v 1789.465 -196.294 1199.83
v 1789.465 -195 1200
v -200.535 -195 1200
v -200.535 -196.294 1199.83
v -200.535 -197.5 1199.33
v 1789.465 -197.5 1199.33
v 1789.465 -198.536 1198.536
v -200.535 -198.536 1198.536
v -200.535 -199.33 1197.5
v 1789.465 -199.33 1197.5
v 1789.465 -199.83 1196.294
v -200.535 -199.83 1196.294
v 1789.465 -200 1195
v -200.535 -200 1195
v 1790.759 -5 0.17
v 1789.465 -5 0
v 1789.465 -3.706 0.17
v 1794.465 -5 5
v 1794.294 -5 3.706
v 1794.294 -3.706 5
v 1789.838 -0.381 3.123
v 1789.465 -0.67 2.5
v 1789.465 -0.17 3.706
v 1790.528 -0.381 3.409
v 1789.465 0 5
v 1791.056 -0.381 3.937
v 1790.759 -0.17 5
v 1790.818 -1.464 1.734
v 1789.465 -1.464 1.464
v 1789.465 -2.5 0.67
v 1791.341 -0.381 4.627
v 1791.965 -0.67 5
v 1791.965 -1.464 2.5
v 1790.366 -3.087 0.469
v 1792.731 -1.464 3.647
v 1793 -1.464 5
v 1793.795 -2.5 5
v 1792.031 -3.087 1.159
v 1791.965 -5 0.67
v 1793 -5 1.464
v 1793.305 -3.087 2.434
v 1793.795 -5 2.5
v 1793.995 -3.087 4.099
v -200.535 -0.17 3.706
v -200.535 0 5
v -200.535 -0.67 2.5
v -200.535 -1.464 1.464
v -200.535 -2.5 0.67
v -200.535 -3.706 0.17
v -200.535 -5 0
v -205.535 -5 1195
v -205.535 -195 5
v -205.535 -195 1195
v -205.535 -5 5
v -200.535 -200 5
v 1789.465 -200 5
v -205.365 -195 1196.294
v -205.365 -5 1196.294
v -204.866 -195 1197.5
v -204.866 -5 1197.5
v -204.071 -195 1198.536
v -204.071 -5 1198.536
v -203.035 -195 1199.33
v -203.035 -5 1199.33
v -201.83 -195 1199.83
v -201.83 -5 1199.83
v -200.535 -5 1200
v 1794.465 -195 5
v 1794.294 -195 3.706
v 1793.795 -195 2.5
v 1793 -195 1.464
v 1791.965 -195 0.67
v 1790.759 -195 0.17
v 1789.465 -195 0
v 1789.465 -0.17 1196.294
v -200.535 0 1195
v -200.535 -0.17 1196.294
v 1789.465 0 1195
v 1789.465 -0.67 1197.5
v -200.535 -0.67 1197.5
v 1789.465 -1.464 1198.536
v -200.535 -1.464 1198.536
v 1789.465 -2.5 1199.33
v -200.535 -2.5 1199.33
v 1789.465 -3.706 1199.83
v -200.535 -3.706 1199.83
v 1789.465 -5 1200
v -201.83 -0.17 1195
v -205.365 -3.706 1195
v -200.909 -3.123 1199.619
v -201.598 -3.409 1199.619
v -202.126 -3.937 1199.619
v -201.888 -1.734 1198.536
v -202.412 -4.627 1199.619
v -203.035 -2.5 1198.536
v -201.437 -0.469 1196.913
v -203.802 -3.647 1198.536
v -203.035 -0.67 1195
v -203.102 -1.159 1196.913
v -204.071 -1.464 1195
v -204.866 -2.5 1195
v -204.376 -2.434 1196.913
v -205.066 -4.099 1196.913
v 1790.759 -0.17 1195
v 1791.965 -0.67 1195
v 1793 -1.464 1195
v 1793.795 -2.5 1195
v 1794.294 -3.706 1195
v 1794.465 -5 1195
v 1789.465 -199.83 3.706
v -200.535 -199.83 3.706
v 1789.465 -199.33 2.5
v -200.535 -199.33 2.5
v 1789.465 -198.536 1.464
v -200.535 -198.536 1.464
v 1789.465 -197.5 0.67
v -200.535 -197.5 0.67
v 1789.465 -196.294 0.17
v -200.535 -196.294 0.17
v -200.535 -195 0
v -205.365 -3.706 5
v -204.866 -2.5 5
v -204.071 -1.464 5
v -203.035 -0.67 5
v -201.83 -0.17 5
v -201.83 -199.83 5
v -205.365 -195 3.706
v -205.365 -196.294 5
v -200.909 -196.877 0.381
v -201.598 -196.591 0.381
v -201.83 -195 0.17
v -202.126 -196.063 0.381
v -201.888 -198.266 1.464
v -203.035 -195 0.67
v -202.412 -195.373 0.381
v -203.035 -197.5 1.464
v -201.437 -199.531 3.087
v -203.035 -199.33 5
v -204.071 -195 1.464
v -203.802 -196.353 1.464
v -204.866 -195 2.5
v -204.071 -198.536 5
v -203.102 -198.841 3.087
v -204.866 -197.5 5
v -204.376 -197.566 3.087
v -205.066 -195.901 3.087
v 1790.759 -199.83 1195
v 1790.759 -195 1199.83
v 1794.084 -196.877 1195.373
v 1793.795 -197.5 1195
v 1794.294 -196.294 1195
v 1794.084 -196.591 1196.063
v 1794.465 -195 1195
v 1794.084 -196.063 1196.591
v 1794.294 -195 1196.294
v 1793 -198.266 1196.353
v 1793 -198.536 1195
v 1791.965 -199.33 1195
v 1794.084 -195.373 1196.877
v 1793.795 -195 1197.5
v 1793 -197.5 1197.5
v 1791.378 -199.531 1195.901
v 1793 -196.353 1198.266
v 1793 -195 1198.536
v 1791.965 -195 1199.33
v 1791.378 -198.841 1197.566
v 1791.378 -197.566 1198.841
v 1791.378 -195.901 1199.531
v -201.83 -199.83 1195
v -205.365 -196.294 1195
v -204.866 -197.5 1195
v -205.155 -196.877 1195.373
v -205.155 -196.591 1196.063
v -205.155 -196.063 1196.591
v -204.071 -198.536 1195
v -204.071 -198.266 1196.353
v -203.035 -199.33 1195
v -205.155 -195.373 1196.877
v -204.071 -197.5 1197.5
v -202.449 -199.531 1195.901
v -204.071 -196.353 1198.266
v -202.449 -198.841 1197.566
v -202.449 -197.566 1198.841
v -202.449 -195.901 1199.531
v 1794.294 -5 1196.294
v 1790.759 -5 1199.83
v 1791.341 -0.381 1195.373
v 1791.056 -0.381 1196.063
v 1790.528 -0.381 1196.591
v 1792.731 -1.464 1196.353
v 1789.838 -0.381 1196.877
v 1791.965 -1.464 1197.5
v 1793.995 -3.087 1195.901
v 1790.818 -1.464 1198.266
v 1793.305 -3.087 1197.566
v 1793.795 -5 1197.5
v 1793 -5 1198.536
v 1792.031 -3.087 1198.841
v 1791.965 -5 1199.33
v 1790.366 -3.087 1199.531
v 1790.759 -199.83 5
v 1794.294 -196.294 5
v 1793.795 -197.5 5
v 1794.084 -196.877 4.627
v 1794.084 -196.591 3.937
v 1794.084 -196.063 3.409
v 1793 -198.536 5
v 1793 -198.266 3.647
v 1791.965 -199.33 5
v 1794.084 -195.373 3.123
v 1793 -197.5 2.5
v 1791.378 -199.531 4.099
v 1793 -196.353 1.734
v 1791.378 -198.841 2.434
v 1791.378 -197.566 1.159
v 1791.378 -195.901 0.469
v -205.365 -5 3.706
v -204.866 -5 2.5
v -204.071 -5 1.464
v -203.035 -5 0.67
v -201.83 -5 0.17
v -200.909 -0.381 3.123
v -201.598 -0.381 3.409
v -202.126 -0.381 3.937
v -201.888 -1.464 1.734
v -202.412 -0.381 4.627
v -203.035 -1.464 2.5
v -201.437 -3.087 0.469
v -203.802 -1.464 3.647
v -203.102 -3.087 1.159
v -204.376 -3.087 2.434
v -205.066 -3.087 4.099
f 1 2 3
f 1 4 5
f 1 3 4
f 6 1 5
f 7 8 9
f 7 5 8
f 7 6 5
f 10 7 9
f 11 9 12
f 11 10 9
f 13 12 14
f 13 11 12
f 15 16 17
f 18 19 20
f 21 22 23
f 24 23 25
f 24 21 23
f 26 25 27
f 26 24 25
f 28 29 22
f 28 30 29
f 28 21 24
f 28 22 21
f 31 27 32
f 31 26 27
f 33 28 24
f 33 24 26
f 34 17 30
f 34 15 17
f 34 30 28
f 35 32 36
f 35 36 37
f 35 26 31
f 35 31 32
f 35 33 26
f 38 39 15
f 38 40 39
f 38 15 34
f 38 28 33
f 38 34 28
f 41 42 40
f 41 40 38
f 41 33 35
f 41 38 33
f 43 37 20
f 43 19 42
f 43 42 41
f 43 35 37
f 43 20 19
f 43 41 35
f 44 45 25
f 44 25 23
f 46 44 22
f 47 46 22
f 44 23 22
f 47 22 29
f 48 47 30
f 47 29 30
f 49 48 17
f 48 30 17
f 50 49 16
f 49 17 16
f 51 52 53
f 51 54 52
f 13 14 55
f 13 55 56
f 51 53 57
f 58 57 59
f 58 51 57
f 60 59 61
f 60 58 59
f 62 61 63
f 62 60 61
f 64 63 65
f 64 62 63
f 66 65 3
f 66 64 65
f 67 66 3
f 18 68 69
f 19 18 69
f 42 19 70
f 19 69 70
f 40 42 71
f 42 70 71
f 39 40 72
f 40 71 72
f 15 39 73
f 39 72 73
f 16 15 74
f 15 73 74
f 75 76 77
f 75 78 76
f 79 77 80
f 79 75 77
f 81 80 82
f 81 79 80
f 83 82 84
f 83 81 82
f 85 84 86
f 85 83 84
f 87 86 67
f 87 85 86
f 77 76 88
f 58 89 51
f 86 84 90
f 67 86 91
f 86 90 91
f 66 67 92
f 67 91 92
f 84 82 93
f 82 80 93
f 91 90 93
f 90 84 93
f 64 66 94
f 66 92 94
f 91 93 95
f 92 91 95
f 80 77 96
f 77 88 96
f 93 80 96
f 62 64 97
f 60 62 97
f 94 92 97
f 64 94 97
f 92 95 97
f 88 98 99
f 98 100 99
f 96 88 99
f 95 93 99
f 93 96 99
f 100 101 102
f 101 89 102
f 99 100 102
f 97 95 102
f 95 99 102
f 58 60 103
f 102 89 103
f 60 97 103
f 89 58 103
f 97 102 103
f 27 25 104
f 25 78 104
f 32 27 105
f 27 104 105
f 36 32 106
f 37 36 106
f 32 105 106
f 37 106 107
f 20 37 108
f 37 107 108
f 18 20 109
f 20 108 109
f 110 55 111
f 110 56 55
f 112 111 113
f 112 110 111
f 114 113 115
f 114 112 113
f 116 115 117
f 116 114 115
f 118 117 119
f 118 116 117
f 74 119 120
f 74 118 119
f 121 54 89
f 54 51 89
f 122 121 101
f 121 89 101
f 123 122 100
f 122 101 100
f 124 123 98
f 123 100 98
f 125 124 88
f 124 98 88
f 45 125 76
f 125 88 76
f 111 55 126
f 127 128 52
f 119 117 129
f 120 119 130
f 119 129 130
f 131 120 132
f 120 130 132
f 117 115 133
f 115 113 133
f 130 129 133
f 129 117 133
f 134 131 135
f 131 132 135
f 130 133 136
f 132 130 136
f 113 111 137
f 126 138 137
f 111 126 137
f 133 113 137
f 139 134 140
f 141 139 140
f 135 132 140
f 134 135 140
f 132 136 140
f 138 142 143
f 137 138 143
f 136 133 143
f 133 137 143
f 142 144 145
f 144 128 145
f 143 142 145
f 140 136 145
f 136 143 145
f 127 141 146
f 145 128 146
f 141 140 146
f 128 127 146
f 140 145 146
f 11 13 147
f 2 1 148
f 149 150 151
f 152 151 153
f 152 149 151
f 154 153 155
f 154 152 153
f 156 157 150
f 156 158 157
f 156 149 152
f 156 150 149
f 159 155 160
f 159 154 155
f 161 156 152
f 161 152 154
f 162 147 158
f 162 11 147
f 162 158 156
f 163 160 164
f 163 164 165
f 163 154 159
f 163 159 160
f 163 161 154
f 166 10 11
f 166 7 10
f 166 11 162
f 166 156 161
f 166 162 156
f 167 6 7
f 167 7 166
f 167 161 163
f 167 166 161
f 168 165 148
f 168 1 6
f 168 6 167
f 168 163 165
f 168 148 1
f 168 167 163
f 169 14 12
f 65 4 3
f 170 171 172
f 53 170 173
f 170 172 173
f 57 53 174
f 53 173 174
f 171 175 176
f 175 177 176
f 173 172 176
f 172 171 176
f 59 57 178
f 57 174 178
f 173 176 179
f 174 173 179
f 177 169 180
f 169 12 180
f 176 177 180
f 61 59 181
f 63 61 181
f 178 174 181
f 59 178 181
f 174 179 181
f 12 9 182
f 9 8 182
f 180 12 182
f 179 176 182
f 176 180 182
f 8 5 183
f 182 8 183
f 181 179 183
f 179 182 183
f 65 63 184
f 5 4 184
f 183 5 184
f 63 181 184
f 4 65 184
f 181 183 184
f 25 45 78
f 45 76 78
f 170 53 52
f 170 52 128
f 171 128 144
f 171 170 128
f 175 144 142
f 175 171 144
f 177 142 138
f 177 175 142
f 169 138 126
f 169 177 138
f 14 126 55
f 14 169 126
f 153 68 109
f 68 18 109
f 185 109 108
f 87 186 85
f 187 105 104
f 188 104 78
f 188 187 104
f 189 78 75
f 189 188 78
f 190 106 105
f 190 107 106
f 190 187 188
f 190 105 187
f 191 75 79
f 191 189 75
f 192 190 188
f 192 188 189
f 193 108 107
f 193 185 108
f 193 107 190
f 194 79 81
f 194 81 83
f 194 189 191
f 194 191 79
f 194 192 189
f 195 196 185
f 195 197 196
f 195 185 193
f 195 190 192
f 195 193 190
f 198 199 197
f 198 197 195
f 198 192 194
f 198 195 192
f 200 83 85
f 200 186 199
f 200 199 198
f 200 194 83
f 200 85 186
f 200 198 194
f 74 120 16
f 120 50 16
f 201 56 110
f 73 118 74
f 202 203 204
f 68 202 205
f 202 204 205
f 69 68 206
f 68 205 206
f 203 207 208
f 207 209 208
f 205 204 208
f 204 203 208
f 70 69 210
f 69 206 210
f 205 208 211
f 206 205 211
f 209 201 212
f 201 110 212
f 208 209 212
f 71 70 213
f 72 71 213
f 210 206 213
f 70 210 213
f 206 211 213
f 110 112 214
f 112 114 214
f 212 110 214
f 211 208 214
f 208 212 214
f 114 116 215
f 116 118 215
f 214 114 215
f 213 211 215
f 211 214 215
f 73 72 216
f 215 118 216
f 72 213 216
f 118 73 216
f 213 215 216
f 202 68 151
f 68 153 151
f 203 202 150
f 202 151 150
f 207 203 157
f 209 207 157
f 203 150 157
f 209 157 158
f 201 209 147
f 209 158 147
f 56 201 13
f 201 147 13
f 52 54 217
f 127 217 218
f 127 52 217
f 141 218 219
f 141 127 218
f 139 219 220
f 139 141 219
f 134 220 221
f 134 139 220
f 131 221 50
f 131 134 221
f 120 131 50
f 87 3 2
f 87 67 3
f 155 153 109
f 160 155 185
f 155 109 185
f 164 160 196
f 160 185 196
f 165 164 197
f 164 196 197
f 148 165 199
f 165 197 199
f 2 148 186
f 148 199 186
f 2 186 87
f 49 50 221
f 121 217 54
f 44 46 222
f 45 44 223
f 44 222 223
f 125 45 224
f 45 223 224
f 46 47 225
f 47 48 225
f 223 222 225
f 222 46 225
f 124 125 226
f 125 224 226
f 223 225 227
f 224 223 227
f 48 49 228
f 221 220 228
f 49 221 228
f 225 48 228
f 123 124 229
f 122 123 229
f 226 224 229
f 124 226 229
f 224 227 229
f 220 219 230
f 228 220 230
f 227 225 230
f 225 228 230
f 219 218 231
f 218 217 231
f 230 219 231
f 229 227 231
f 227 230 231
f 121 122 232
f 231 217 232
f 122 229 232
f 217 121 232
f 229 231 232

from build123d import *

# Parameters (mm, degrees)
F0_W     = 2000
F0_H     = 1200
F1_DEPTH = 25
F2_DEPTH = 200
F3_R     = 5


with BuildPart() as f1:
    # F0 (on Front) → F1 (new body)
    with BuildSketch(Plane.XZ):
        with Locations((794.464558, 600)):
            Rectangle(F0_W, F0_H)
    extrude(amount=F1_DEPTH)

    # F0 (on Front) → F2 (join)
    with BuildSketch(Plane.XZ):
        with Locations((794.464558, 600)):
            Rectangle(F0_W, F0_H)
    extrude(amount=F2_DEPTH)

    # F3
    f3_edges = [f1.edges().sort_by_distance(p)[0] for p in [
        (794.464558, -200, 1200),
        (-205.535442, -200, 600),
        (794.464558, -200, 0),
        (1794.464558, -200, 600),
        (-205.535442, -100, 0),
        (1794.464558, -100, 0),
        (794.464558, 0, 0),
        (1794.464558, -100, 1200),
        (1794.464558, 0, 600),
        (-205.535442, 0, 600),
        (794.464558, 0, 1200),
        (-205.535442, -100, 1200),
    ]]
    fillet(f3_edges, radius=F3_R)


solid = f1.part
